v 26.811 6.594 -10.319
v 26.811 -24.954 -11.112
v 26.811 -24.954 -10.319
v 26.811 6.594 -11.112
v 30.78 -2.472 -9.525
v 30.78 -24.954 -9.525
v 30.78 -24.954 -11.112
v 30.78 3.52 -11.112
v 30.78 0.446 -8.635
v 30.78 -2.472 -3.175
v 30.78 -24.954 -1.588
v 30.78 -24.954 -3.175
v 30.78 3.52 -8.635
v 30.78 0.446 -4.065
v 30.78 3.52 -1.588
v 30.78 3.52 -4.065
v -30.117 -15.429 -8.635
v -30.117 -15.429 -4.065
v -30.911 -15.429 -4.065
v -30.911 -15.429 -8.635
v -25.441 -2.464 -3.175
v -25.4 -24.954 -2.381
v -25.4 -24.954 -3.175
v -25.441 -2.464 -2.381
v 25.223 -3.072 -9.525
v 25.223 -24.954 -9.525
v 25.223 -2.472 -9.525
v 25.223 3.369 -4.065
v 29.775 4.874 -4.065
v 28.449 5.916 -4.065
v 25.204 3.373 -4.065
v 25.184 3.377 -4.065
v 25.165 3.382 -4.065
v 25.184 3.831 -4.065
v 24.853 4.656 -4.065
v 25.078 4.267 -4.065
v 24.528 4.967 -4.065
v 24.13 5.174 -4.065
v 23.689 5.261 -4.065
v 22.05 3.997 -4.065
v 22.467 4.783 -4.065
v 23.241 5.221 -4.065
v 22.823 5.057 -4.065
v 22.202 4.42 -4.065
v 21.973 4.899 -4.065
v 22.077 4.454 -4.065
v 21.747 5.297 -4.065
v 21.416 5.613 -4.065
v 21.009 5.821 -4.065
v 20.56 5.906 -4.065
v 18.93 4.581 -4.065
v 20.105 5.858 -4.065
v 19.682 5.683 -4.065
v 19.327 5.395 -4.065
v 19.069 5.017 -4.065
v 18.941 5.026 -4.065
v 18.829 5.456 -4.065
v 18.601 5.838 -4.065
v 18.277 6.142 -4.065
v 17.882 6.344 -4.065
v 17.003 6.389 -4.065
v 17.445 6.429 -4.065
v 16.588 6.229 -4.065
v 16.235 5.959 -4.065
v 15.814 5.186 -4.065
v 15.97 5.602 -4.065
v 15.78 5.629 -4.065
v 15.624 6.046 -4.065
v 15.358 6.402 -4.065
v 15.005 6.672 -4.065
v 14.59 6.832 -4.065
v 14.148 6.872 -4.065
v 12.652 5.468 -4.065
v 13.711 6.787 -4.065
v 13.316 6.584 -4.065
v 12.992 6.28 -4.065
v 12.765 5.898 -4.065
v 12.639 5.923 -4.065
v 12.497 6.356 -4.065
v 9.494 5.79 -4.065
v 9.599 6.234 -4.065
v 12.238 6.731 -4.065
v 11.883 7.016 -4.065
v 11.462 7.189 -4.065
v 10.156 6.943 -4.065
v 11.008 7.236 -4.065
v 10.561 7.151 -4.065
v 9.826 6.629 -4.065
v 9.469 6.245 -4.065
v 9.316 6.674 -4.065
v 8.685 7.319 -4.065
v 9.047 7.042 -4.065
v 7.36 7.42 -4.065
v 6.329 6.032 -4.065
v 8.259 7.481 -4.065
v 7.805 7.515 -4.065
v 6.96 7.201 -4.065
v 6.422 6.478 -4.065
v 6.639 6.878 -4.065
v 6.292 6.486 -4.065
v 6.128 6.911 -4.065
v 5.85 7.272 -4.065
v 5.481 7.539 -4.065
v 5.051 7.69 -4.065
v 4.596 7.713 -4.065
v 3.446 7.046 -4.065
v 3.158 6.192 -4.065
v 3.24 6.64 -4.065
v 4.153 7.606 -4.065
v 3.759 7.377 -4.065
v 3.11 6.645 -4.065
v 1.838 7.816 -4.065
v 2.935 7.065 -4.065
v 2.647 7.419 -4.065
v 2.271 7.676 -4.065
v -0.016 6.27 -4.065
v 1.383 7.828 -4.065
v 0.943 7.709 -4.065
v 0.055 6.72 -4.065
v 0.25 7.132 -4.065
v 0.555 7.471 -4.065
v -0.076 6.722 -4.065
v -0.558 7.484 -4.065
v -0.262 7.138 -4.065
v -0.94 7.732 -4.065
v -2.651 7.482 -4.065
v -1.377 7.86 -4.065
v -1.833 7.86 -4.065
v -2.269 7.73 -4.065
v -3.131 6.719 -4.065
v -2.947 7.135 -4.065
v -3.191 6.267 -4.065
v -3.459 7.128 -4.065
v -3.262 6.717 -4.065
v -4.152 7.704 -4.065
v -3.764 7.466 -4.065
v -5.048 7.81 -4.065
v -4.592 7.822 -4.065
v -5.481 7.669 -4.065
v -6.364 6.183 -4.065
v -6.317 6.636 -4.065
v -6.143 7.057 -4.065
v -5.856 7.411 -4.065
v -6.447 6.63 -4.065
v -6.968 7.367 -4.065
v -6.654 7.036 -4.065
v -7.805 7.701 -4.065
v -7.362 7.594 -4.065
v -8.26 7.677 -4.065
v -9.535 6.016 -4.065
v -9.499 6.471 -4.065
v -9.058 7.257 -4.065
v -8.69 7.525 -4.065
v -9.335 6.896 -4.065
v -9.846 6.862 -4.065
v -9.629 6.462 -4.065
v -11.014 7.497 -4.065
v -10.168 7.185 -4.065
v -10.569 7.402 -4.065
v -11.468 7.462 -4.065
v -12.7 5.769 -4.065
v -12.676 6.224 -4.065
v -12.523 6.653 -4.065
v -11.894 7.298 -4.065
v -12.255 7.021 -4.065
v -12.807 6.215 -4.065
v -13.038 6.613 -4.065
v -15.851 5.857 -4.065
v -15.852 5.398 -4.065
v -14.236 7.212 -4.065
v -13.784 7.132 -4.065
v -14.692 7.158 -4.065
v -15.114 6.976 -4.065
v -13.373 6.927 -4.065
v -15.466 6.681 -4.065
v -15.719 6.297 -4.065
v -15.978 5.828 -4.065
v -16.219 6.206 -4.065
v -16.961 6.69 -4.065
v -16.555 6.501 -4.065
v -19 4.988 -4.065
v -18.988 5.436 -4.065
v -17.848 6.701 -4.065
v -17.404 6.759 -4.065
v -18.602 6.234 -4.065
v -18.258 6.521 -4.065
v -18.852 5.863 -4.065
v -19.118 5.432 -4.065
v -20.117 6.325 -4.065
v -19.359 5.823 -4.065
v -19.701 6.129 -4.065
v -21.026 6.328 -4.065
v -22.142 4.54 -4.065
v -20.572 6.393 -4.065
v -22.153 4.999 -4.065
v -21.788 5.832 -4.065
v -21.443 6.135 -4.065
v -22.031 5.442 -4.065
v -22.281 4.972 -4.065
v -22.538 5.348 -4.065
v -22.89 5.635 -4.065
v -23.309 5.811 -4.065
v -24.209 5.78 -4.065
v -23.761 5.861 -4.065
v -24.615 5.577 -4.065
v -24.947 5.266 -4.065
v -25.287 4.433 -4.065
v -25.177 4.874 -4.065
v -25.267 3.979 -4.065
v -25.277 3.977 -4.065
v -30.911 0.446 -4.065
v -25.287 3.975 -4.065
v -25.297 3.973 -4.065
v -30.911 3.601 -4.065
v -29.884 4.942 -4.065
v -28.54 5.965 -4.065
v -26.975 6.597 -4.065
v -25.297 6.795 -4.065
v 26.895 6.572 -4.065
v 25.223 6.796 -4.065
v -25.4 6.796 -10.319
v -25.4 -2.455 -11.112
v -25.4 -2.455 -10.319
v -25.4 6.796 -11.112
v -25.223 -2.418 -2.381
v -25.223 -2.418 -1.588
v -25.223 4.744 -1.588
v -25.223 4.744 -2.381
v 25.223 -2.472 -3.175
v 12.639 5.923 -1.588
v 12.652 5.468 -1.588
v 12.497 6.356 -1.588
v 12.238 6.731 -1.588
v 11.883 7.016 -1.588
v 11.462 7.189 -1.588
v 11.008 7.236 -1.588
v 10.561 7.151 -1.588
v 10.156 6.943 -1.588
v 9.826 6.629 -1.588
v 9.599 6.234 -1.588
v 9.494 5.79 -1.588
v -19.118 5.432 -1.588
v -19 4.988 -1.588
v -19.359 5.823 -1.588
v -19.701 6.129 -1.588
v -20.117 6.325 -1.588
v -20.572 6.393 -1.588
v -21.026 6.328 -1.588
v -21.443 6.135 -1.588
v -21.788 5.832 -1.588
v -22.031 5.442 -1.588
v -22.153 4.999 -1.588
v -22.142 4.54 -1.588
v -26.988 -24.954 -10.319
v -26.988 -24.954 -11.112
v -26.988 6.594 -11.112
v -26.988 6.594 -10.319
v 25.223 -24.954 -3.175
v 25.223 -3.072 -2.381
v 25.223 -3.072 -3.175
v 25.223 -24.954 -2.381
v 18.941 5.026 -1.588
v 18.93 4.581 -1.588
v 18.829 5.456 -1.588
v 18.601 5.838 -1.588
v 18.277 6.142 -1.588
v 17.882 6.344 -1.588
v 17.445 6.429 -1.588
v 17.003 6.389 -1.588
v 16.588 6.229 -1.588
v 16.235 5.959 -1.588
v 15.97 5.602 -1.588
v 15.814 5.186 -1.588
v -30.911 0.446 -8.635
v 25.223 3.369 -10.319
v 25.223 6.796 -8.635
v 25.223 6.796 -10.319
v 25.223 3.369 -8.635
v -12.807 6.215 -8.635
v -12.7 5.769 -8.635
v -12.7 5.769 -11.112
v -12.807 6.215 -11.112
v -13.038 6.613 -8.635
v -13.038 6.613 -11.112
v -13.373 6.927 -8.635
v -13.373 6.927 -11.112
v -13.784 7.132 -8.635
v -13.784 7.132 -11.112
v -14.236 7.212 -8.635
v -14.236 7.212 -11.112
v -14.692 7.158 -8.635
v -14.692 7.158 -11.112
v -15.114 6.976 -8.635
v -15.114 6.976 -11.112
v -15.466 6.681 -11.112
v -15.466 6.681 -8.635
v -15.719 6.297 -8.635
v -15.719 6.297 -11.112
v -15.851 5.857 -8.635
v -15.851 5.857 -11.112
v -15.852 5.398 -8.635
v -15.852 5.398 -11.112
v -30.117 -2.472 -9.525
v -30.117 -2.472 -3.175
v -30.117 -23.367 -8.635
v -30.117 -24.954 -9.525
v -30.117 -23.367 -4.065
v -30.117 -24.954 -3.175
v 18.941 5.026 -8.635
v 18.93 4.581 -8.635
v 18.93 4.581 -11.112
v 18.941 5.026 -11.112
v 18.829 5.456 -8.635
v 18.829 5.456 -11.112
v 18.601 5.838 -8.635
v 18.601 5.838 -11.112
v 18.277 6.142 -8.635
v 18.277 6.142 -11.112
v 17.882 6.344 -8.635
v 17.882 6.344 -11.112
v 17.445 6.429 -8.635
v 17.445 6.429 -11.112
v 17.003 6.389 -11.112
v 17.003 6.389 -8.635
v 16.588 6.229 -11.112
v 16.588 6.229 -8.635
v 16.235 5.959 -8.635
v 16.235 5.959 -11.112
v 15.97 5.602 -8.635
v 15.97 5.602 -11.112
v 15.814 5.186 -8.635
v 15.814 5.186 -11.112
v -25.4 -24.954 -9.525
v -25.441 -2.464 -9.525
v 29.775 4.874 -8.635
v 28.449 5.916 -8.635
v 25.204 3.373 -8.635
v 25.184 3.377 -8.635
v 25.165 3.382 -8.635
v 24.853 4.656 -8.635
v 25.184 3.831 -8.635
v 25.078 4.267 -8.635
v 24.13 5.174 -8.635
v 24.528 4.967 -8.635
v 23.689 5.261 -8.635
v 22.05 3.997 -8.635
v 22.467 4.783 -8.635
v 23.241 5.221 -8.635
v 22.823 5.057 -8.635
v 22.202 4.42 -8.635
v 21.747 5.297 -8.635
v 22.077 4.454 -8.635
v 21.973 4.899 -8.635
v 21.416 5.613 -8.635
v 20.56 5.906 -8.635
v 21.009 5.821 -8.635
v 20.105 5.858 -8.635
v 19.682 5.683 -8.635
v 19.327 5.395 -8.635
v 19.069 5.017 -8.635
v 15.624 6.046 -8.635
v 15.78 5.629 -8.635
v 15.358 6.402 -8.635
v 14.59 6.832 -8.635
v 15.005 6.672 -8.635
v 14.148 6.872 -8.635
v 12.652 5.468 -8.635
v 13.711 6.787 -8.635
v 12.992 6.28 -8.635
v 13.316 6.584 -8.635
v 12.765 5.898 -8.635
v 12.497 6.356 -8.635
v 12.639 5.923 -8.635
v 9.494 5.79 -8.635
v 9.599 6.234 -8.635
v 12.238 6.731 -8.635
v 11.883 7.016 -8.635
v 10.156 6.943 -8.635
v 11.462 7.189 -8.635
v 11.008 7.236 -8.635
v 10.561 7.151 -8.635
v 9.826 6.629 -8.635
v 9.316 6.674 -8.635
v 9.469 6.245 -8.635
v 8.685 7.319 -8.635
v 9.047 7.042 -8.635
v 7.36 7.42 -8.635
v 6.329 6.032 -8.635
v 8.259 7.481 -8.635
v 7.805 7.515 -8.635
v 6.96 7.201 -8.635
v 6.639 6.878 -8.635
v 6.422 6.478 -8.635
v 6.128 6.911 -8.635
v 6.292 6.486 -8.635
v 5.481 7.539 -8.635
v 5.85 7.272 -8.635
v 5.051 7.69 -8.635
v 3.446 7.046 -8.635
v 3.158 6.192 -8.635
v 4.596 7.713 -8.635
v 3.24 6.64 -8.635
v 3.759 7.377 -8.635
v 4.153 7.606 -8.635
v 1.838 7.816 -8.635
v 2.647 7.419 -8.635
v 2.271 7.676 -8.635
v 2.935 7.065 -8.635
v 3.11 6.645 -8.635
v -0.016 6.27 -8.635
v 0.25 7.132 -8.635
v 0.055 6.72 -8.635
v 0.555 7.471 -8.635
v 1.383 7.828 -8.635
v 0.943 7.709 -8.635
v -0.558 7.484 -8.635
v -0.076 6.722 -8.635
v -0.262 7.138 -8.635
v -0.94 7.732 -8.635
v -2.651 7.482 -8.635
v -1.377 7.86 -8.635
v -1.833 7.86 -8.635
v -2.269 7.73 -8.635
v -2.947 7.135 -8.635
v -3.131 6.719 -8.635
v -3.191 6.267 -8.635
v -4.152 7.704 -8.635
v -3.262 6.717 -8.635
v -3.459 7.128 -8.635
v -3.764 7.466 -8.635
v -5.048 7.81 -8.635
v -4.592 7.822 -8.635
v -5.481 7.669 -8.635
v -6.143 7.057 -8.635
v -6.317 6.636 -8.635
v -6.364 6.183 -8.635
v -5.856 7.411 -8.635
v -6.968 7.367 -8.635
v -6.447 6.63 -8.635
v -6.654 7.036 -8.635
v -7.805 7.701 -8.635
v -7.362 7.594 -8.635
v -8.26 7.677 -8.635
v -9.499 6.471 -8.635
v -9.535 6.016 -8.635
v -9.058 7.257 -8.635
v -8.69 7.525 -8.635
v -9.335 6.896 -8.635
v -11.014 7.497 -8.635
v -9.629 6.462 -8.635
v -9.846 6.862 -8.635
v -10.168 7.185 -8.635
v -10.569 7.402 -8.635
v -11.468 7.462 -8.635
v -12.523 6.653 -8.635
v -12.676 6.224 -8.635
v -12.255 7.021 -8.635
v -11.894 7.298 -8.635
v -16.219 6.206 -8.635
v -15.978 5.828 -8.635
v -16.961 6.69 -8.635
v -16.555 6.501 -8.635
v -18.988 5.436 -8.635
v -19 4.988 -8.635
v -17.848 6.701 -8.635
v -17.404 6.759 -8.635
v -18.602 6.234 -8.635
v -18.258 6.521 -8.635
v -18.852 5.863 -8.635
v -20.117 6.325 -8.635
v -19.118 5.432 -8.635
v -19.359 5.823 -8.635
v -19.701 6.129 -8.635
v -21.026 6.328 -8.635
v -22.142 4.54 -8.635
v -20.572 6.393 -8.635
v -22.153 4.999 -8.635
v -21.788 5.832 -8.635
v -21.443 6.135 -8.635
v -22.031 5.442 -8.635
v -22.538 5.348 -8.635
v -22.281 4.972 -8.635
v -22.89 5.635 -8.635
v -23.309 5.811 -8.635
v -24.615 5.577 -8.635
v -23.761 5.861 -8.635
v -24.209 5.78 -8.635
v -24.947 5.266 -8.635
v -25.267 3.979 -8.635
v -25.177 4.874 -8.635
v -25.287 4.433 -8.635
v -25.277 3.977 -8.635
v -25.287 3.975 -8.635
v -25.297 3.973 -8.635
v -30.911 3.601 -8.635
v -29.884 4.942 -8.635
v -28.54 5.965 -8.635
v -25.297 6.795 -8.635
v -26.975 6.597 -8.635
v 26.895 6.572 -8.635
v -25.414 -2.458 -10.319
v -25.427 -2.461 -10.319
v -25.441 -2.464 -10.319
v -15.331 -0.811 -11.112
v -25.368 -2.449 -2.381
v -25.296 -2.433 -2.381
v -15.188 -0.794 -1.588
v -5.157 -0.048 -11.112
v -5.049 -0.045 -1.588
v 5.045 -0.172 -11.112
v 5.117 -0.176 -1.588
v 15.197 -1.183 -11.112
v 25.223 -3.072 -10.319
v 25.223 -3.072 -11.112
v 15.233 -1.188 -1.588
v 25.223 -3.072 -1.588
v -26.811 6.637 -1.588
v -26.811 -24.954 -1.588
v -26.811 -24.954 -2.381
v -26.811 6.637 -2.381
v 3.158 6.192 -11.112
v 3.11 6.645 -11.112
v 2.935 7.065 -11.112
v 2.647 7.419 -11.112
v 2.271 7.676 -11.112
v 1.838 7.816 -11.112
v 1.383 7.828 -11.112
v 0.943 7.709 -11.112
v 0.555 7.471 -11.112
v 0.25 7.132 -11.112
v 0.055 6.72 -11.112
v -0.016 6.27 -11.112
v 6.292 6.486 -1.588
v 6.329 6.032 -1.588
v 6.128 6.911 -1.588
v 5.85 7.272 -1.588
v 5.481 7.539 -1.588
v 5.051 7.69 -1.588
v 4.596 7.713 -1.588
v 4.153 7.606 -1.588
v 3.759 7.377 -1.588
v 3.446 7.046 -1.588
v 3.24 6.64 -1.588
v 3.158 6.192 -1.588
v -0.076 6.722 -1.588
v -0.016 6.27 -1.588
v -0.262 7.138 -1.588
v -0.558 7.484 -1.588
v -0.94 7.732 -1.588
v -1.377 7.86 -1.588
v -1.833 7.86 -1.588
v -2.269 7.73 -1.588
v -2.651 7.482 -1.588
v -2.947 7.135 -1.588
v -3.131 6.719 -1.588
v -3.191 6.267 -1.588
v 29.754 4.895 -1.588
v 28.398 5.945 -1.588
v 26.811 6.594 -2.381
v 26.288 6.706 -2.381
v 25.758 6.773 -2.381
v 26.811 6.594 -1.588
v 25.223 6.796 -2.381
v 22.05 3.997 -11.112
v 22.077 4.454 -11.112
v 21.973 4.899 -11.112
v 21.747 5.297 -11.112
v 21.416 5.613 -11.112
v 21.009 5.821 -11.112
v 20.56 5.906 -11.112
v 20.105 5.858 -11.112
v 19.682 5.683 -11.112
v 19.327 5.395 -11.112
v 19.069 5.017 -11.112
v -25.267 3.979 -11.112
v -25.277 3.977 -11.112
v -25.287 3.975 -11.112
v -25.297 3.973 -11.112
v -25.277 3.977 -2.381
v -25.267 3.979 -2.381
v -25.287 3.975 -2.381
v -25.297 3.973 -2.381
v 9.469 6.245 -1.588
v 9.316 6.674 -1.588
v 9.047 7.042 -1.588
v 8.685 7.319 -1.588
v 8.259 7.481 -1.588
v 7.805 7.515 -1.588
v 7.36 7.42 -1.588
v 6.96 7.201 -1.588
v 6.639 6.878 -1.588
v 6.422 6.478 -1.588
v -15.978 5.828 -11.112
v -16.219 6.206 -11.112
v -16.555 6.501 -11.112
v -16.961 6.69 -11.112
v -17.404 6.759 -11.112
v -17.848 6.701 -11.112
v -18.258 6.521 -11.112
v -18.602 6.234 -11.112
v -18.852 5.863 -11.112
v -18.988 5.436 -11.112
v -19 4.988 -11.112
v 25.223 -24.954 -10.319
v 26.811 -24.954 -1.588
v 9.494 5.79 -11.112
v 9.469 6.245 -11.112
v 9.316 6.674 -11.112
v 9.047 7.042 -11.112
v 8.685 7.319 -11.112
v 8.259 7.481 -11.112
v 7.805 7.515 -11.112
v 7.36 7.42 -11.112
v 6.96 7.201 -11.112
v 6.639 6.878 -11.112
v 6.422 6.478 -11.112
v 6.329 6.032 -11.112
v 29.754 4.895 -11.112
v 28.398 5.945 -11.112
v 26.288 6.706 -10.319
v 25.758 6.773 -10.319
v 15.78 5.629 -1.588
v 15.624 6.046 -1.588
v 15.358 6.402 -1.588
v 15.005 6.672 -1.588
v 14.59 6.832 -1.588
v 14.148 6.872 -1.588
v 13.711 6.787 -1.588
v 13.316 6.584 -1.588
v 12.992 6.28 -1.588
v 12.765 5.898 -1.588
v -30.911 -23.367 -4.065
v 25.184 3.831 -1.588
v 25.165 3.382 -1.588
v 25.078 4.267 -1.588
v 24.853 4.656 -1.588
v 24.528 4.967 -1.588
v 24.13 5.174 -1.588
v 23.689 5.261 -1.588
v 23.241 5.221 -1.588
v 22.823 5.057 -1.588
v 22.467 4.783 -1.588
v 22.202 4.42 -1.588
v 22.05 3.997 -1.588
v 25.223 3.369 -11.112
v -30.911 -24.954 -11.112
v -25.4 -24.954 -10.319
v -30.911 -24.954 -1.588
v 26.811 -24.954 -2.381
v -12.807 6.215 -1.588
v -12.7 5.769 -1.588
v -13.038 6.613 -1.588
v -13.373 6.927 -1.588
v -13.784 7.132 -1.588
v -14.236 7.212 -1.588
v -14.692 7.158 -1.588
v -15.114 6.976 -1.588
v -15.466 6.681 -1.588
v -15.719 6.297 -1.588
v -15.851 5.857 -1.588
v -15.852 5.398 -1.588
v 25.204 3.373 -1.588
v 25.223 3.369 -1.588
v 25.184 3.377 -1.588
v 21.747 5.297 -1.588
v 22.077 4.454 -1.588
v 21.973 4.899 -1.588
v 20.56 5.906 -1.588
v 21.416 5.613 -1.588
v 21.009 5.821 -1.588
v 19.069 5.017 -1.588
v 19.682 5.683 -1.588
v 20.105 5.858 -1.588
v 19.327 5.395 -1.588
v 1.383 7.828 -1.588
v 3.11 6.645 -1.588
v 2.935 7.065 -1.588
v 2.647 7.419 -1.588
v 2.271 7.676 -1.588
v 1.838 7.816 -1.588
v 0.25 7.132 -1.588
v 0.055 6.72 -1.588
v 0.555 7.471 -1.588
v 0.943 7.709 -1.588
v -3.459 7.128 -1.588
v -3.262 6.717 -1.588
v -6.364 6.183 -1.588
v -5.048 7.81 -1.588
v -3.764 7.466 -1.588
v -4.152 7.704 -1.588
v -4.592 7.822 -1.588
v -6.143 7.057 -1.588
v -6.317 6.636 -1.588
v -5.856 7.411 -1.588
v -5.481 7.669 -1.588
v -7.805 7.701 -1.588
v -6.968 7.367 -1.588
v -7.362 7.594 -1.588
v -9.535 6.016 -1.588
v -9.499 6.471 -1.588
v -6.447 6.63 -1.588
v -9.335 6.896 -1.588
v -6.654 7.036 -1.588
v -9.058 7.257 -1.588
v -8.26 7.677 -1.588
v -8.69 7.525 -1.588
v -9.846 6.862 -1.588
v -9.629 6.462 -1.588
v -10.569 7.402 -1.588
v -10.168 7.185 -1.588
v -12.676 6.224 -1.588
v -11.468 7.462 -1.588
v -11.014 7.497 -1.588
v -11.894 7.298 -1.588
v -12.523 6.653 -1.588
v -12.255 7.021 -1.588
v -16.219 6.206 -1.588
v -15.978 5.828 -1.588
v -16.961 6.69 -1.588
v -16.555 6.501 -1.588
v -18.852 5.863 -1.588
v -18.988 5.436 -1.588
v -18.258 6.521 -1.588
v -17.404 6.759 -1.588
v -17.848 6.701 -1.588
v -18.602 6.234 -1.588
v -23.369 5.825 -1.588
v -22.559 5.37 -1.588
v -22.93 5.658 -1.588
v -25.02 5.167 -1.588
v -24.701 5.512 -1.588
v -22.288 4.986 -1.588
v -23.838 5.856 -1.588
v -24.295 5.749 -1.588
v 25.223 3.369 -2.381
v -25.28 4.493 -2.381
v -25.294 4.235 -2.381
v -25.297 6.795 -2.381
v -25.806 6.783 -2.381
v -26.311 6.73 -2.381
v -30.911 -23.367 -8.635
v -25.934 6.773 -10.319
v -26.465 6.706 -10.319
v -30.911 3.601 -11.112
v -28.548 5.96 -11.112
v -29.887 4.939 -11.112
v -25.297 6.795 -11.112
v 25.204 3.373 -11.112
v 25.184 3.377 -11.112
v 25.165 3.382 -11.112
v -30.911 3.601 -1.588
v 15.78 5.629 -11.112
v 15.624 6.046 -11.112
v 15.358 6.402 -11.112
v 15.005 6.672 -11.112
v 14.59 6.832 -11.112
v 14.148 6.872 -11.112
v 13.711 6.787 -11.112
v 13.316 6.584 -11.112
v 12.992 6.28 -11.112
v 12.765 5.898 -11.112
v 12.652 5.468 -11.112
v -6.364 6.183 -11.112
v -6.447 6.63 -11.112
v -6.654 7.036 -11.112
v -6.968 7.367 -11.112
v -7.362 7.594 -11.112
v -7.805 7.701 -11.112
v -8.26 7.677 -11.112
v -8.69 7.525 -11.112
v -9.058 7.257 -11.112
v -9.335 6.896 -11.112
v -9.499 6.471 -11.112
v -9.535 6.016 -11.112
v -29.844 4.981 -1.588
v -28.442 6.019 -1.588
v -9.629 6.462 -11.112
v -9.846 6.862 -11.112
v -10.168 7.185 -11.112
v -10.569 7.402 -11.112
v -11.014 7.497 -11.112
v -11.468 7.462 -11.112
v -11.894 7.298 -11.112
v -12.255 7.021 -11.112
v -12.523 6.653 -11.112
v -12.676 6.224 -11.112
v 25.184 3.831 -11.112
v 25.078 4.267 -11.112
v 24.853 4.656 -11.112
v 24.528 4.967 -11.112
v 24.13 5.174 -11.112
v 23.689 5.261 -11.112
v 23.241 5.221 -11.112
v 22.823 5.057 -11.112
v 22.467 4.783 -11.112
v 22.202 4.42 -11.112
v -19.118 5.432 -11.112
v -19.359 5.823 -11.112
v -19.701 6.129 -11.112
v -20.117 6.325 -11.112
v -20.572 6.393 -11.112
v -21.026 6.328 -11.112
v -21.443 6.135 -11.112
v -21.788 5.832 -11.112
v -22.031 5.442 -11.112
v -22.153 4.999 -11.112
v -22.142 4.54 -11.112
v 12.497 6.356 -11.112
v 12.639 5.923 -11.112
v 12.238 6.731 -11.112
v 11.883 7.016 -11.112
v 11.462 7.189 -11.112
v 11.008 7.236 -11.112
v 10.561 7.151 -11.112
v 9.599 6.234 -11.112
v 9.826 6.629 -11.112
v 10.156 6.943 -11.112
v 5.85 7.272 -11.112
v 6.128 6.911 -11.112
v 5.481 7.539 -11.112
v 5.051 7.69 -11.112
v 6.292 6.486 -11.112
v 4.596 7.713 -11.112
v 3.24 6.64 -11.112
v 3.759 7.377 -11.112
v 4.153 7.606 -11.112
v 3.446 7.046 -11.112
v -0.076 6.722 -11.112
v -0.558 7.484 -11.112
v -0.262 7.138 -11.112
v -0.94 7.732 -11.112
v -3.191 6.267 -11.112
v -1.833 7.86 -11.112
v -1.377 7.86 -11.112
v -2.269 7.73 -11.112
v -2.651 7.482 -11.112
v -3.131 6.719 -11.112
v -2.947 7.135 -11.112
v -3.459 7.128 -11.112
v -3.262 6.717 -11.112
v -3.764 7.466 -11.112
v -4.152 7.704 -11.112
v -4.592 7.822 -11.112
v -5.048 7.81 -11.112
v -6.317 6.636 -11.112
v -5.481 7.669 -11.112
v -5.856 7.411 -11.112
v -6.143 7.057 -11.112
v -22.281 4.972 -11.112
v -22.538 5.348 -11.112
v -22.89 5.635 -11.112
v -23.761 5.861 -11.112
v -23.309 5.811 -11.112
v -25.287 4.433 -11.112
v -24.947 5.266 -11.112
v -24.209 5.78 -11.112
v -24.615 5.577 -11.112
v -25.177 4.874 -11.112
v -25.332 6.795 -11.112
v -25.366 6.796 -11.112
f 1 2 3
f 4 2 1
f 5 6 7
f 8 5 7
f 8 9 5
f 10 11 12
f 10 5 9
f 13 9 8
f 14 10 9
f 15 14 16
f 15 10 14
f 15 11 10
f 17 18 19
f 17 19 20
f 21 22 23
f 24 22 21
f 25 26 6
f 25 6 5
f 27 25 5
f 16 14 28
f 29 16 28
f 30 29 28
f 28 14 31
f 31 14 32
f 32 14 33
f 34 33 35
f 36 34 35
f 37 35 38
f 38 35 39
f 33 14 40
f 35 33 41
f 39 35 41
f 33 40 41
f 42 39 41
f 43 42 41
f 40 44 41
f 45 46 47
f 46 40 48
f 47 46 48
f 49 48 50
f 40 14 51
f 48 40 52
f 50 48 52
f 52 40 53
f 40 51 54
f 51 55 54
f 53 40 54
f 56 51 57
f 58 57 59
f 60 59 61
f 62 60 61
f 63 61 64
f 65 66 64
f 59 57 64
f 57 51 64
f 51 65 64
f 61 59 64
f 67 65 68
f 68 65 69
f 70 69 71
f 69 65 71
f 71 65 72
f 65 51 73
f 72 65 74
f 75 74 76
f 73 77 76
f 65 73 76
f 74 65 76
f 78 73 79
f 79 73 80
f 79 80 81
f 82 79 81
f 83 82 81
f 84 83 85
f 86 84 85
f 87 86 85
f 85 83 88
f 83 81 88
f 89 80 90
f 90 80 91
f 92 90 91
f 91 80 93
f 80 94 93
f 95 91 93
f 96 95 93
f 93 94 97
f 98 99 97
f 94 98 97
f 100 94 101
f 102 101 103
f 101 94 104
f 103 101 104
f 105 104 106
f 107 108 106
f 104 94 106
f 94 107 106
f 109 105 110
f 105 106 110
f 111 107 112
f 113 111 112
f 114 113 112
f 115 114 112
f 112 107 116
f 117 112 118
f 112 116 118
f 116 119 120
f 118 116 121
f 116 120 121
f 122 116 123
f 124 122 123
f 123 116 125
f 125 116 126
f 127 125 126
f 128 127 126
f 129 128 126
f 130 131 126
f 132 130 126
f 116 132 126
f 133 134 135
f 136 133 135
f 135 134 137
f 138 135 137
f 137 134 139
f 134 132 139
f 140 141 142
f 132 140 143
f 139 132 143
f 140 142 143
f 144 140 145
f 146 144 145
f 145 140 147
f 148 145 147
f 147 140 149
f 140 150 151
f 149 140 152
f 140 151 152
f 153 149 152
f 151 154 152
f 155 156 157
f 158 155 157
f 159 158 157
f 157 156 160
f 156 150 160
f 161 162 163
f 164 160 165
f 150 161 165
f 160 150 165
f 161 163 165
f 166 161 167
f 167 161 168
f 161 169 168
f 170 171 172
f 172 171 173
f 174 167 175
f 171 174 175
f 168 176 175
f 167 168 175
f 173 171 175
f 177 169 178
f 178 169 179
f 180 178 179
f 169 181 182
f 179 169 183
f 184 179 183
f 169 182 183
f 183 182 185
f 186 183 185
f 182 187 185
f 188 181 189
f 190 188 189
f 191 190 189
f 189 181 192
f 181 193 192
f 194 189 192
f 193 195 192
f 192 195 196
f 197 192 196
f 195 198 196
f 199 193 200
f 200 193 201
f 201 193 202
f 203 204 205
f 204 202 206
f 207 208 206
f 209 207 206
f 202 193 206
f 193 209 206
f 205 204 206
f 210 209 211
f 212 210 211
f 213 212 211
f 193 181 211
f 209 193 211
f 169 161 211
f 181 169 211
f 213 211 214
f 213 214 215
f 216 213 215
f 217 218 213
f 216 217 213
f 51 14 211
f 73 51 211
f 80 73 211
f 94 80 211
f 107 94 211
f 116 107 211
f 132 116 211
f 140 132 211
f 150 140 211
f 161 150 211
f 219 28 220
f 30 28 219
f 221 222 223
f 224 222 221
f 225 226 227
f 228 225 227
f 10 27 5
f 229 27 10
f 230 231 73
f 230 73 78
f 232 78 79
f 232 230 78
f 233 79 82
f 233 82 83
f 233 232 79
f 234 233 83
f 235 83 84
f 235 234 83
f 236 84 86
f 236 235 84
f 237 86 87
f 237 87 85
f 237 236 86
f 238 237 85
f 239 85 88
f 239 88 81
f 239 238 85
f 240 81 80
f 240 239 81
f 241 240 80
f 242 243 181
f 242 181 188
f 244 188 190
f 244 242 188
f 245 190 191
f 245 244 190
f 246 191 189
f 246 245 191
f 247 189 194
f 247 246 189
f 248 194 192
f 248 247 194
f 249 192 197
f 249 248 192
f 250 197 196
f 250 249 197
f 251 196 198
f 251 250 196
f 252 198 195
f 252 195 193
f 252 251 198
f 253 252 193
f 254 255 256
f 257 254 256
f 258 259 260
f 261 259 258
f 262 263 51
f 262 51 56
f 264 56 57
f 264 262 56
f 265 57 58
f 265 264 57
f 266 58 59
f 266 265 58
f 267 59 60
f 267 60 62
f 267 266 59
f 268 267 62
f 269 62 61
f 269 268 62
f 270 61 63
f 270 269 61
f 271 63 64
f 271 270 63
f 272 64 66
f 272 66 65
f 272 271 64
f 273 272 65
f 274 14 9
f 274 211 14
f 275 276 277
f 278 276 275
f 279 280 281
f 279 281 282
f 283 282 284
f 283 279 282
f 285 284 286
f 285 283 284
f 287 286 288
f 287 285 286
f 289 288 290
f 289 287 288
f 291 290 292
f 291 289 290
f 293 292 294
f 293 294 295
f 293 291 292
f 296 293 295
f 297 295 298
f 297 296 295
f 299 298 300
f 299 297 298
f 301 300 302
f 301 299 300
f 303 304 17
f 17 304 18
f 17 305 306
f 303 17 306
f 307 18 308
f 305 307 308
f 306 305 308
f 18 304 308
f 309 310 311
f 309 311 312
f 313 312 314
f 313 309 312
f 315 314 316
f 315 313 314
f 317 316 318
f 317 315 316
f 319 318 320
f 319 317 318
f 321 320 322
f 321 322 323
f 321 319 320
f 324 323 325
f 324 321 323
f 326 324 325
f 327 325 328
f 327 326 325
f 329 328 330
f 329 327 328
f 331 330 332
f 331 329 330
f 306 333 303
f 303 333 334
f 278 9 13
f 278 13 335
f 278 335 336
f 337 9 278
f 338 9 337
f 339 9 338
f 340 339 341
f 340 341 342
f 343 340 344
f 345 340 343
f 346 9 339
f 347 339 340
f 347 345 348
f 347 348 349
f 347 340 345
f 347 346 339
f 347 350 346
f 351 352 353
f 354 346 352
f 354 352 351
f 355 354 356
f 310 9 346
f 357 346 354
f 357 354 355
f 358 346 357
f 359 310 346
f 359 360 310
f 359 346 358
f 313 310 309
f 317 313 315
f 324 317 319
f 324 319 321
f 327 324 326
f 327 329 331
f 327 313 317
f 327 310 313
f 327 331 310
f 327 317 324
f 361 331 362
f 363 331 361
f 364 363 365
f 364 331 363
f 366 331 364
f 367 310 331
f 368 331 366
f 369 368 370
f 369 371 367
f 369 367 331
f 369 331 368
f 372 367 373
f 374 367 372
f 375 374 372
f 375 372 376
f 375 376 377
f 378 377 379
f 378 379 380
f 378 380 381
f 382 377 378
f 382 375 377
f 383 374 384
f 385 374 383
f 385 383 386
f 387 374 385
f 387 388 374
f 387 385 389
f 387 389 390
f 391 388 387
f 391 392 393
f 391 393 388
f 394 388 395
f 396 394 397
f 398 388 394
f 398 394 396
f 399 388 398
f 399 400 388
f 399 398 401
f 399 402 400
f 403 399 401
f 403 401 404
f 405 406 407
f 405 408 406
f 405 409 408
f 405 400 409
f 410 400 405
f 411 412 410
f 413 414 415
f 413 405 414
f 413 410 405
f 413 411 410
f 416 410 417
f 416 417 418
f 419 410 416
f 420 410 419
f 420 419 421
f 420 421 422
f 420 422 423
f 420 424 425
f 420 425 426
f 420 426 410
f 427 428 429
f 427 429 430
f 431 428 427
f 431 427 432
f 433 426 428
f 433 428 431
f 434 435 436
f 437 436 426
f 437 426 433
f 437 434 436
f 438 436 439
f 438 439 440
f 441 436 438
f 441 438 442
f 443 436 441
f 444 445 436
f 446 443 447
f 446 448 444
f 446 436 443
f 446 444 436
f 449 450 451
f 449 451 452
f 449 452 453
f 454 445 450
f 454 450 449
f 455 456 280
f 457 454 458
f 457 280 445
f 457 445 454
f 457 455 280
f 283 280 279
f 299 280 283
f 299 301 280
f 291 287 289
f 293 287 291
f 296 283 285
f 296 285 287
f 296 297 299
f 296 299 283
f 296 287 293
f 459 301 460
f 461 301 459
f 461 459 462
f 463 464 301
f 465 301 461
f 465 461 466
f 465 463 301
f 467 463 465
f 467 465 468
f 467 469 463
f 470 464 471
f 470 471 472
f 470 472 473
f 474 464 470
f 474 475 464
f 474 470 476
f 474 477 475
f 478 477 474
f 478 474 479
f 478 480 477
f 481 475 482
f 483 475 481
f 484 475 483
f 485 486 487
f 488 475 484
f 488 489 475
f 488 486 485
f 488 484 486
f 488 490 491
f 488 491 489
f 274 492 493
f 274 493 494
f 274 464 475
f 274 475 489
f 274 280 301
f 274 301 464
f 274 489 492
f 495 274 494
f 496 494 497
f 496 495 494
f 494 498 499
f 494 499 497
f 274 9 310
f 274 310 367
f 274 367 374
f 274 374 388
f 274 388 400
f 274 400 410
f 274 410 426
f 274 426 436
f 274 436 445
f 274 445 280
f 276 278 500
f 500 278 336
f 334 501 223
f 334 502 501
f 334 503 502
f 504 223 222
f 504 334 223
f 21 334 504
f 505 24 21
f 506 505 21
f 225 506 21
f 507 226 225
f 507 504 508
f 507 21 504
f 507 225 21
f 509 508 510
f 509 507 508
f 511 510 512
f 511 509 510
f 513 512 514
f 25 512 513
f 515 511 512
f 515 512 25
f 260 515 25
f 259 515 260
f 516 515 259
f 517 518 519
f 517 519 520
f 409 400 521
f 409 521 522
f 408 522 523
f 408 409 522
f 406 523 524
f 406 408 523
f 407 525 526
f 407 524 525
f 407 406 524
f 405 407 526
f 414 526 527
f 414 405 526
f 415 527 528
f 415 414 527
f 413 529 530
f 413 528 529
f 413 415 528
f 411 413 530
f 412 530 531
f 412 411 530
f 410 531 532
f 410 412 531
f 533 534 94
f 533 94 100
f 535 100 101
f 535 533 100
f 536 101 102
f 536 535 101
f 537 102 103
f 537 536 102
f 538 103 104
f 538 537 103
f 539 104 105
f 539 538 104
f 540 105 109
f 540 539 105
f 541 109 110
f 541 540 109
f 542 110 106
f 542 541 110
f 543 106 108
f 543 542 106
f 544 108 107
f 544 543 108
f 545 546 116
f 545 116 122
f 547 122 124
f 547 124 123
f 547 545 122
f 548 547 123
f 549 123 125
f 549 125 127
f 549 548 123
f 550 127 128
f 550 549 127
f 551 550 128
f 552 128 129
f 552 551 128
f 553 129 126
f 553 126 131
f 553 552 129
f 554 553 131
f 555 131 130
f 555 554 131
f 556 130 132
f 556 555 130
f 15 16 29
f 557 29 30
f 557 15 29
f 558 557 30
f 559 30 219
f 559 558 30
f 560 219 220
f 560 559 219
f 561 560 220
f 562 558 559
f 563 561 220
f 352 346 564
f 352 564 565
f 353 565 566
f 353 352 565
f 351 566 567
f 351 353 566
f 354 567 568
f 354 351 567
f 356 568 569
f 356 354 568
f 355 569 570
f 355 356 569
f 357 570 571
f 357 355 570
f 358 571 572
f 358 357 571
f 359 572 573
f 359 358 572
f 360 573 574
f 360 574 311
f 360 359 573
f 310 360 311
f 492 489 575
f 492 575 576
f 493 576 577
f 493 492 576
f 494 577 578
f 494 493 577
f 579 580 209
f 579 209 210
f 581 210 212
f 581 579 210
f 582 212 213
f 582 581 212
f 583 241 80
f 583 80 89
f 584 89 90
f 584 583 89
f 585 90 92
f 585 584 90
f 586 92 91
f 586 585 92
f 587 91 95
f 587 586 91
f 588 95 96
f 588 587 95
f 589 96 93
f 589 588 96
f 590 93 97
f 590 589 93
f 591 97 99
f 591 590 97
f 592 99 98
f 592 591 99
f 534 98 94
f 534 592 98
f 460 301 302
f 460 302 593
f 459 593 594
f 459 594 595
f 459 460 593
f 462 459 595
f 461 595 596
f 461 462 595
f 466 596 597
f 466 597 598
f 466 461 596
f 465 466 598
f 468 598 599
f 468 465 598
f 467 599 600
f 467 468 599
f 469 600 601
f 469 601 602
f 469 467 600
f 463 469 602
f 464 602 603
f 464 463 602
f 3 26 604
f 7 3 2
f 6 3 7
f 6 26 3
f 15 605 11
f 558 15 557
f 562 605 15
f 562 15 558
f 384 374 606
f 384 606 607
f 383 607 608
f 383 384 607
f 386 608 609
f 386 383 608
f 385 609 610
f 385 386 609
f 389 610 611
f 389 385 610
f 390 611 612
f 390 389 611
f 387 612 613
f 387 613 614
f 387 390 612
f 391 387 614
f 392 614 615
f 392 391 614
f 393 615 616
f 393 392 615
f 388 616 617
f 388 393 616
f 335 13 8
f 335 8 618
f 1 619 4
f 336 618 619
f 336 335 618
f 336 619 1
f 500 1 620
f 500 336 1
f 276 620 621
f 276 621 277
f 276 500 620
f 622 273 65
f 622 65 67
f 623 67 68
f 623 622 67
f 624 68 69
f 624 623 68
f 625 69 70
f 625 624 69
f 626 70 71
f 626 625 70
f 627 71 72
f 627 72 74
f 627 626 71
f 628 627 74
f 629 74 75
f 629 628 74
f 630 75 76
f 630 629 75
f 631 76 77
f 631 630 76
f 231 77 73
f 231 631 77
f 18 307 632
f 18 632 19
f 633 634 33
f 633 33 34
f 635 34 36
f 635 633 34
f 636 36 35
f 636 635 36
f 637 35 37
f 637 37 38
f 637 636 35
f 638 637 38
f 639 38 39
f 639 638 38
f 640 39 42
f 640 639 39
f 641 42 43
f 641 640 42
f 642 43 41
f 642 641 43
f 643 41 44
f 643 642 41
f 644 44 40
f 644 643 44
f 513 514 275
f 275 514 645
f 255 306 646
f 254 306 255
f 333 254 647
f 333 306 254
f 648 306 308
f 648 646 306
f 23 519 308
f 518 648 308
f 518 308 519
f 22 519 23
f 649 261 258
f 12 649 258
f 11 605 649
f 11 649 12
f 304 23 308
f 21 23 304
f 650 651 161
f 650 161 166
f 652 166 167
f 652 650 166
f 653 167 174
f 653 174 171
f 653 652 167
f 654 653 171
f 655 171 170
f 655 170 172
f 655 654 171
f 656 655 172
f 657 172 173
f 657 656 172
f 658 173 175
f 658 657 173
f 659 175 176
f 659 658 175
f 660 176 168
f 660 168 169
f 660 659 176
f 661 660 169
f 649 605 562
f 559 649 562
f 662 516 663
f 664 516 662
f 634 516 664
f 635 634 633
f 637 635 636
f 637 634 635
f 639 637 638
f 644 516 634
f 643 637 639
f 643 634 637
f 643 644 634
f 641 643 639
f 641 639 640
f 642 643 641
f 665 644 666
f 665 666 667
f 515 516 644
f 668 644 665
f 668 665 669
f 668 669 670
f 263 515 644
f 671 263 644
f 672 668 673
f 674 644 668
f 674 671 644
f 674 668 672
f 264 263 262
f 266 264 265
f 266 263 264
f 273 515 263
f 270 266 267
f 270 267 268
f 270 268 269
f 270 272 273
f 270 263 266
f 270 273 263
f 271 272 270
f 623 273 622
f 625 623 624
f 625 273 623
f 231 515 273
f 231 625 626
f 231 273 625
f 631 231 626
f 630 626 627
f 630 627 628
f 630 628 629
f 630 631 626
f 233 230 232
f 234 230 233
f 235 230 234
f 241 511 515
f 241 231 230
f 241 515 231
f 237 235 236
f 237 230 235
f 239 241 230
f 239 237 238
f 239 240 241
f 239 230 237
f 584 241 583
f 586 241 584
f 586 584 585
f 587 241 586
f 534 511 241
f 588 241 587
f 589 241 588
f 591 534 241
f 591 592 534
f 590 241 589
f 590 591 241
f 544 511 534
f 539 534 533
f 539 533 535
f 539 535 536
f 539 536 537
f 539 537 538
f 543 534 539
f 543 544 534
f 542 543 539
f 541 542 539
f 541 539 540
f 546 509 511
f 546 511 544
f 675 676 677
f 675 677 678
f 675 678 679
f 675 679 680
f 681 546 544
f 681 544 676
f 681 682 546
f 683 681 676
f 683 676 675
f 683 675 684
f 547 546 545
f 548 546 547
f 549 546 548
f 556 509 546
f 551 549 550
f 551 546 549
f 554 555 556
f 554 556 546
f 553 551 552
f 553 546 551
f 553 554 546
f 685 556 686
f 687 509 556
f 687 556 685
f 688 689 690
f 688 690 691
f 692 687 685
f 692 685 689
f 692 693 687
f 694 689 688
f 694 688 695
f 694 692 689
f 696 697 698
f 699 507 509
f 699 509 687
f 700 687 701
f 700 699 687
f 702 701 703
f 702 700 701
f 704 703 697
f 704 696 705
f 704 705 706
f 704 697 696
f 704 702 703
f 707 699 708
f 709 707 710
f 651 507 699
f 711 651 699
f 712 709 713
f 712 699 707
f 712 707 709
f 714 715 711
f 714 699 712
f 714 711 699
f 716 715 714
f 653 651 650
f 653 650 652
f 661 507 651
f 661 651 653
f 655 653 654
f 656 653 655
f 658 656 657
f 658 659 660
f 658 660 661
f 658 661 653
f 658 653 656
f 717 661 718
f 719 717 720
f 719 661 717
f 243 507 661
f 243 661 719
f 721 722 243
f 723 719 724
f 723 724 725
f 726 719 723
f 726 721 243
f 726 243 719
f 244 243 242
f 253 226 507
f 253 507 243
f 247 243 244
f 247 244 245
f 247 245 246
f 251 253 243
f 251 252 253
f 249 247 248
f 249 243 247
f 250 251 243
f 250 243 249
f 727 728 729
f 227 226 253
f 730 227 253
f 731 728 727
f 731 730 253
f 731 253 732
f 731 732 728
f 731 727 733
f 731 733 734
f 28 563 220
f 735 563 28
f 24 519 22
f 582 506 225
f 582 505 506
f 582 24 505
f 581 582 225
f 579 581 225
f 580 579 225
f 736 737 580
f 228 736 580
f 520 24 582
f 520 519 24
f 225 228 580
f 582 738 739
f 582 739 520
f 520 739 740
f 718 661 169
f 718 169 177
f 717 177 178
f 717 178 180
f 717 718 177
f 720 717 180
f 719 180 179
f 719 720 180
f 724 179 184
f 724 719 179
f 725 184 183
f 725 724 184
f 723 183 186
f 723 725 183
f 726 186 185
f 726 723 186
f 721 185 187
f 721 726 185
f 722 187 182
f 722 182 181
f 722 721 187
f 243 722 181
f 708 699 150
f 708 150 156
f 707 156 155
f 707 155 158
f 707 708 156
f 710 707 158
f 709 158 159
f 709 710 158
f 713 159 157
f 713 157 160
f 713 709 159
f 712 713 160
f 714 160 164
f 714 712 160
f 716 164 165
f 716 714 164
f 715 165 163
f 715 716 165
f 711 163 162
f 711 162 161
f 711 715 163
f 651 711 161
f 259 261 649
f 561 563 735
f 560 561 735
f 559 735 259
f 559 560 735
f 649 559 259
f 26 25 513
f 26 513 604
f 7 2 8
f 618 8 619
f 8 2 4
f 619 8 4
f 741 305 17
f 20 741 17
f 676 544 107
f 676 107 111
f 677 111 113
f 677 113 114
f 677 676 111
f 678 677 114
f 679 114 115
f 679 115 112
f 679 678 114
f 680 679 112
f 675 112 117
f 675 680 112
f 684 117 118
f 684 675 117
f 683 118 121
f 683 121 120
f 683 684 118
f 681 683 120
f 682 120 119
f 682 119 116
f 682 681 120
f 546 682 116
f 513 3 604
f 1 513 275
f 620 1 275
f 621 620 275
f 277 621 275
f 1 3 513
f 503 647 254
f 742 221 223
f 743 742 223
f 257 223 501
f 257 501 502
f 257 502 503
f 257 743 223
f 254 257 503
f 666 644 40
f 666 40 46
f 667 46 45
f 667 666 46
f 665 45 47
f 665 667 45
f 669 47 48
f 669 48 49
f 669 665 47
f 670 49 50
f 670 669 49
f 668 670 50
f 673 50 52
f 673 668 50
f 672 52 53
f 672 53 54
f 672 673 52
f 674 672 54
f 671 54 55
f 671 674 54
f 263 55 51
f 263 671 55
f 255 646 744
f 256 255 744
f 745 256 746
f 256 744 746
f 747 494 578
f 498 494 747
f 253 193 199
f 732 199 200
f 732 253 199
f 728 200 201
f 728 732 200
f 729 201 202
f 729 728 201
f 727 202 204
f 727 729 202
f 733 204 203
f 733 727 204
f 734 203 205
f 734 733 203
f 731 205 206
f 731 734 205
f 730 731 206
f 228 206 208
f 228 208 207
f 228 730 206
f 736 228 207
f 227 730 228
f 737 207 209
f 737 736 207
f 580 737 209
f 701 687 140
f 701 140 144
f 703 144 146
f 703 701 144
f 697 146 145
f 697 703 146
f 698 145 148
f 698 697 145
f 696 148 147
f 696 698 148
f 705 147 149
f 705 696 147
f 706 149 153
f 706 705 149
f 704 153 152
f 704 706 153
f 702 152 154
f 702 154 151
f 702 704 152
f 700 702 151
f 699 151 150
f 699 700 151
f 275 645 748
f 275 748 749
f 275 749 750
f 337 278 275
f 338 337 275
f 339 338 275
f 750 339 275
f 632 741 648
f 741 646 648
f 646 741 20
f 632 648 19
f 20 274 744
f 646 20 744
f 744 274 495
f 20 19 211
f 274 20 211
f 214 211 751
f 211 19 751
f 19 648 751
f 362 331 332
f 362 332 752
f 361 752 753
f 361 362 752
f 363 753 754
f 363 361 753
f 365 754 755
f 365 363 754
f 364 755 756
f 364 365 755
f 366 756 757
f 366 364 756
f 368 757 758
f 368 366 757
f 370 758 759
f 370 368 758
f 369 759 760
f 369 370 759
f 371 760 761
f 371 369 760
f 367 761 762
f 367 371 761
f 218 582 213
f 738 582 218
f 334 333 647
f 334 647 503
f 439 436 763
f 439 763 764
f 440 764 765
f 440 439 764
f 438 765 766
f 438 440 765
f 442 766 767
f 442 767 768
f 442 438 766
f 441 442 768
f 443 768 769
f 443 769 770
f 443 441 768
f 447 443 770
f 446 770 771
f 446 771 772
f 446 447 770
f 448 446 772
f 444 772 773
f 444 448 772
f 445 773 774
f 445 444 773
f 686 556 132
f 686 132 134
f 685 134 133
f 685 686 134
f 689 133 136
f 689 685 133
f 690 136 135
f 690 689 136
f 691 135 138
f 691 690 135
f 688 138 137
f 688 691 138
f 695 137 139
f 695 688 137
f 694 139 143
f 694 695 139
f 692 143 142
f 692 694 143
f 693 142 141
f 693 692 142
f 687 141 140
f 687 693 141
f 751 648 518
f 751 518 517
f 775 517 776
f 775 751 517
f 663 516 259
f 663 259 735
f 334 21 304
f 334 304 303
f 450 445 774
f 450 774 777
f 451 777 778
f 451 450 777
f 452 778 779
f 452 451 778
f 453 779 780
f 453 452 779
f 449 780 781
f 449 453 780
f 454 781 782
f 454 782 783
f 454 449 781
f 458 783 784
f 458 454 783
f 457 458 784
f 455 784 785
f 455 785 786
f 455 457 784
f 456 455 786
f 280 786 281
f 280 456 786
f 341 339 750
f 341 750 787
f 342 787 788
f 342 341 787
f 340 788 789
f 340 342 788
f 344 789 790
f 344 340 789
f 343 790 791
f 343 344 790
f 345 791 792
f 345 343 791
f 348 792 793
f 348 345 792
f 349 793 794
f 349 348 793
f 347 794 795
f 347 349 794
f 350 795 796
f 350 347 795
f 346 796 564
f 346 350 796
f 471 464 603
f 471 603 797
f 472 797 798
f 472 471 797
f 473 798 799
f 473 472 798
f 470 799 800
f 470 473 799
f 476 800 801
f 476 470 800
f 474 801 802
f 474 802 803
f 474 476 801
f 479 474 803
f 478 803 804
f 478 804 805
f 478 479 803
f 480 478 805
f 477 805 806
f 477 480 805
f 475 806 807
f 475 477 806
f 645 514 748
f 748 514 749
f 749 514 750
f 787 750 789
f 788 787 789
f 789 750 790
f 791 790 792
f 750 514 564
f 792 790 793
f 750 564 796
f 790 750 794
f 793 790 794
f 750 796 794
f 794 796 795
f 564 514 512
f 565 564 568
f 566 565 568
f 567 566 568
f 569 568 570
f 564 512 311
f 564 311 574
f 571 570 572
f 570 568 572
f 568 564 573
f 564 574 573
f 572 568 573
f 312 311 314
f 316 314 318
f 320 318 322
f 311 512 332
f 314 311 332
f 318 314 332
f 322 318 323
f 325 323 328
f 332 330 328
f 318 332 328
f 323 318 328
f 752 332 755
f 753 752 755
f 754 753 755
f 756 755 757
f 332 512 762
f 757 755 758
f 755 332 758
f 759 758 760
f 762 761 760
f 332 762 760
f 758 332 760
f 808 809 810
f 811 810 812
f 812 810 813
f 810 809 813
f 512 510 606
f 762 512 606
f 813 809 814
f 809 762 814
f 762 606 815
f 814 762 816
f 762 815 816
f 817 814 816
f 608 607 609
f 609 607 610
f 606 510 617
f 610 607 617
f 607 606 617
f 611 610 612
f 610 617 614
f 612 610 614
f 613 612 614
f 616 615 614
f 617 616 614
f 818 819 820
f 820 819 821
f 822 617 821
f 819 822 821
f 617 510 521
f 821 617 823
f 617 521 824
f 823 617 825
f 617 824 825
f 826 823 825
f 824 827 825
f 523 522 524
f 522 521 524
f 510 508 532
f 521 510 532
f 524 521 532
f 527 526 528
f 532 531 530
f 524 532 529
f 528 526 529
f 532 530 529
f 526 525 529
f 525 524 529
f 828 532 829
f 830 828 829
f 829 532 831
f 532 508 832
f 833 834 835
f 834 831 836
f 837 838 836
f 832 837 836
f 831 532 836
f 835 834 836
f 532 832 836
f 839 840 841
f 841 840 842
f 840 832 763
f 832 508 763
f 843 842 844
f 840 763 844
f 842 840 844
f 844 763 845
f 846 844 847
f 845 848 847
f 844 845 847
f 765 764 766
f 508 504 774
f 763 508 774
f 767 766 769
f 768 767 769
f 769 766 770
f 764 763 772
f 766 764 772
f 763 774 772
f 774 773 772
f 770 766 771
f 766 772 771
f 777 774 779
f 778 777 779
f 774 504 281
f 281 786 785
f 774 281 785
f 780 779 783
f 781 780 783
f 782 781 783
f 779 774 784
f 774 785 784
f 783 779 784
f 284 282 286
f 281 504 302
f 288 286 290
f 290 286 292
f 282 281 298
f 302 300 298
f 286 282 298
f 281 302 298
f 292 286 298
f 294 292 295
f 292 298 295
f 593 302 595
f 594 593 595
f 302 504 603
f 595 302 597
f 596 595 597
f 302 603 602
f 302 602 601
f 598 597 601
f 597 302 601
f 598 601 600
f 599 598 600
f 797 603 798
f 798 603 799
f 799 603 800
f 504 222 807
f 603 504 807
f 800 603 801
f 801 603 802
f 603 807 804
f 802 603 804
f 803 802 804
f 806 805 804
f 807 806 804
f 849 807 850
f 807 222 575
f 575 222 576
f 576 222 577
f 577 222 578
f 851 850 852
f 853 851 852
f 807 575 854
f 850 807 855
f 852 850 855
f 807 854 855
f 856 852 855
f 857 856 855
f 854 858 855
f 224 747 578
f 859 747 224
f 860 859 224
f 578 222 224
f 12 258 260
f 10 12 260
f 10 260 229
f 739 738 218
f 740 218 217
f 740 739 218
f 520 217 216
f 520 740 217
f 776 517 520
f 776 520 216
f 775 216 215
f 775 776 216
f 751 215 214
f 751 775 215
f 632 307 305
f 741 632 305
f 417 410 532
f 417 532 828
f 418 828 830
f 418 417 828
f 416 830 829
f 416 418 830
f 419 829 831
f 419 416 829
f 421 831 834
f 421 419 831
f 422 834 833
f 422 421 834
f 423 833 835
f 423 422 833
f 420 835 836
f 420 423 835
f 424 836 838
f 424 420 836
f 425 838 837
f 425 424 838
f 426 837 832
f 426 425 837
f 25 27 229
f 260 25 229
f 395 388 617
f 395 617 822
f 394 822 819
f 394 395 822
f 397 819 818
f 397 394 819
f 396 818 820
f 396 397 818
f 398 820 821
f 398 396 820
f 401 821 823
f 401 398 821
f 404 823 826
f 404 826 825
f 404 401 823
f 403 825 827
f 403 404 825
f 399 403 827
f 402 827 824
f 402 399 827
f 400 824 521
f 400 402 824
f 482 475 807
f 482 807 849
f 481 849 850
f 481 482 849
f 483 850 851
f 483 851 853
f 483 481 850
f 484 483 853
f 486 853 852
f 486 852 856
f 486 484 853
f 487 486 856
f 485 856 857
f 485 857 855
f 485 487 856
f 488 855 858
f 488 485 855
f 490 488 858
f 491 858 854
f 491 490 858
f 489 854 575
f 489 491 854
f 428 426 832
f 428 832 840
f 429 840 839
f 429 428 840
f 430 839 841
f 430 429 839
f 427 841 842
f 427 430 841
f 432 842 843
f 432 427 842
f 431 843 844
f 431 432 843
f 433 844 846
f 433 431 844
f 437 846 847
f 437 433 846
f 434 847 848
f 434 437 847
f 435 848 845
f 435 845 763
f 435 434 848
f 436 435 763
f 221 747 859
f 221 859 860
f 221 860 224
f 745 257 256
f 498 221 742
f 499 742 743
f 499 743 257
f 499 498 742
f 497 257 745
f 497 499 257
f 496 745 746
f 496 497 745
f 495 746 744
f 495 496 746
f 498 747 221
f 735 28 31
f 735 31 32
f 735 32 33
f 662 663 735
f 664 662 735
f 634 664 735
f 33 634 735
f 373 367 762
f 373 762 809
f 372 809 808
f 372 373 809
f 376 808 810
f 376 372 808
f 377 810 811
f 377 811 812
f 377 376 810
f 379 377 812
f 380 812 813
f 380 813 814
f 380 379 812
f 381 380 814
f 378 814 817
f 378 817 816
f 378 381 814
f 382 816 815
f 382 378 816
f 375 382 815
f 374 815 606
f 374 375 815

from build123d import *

# Parameters (mm, degrees)
BOSS_EXTRUDE1_DEPTH              = 12.7
SKETCH3_W                        = 4.569606656
SKETCH3_H                        = 12.610946307
CUT_EXTRUDE1_DEPTH               = 32.573497659
CUT_EXTRUDE1_DEPTH_BACK          = 32.704428158
SKETCH4_W                        = 4.569606656
SKETCH4_H                        = 7.9375
CUT_EXTRUDE2_DEPTH               = 66.04
SKETCH5_W                        = 1.5875
SKETCH5_H                        = 39.725965327
CUT_EXTRUDE3_DEPTH               = 32.573497659
CUT_EXTRUDE3_DEPTH_BACK          = 32.704428158
SKETCH6_W                        = 1.5875
SKETCH6_H                        = 40.415060451
CUT_EXTRUDE4_DEPTH               = 0.79375
SKETCH7_W                        = 1.5875
SKETCH7_H                        = 38.718479636
SKETCH7_H_2                      = 39.708151778
CUT_EXTRUDE5_DEPTH               = 0.79375
CUT_EXTRUDE6_REACH               = 9.892
CUT_EXTRUDE6_OFFSET_FROM_SURFACE = 1.5875
SKETCH8_W                        = 6.35
SKETCH8_H                        = 22.490762182
SKETCH9_W                        = 6.35
SKETCH9_H                        = 22.482269966
CUT_EXTRUDE7_DEPTH               = 5.55625
SKETCH10_W                       = 0.79375
SKETCH10_H                       = 36.880517087
CUT_EXTRUDE8_DEPTH               = 12.1125


with BuildPart() as part:
    # Sketch1 → Boss-Extrude1 (new body)
    with BuildSketch(Plane.XY):
        with BuildLine():
            Line((25.223497659, -24.95432425), (31.573497659, -24.95432425))
            Line((31.573497659, -24.95432425), (31.573497659, 0.44567575))
            ThreePointArc((31.573497659, 0.44567575), (29.713625719, 4.935803811), (25.223497659, 6.79567575))
            Line((25.223497659, 6.79567575), (25.223497659, 3.36874218))
            ThreePointArc((25.223497659, 3.36874218), (25.194005143, 3.37526688), (25.164511033, 3.381784371))
            ThreePointArc((25.164511033, 3.381784371), (23.912297459, 5.232947026), (22.049913461, 3.997484421))
            ThreePointArc((22.049913461, 3.997484421), (20.787428344, 5.879791305), (18.929672437, 4.581449722))
            ThreePointArc((18.929672437, 4.581449722), (17.666399498, 6.401938478), (15.813867684, 5.186140916))
            ThreePointArc((15.813867684, 5.186140916), (14.370419451, 6.86745546), (12.652448322, 5.467835298))
            ThreePointArc((12.652448322, 5.467835298), (11.236710182, 7.228730664), (9.494148573, 5.790486593))
            ThreePointArc((9.494148573, 5.790486593), (8.033635968, 7.514426817), (6.328601682, 6.03188675))
            ThreePointArc((6.328601682, 6.03188675), (4.824278861, 7.717733664), (3.157897585, 6.191876393))
            ThreePointArc((3.157897585, 6.191876393), (1.610757722, 7.838516978), (-0.015870376, 6.270349895))
            ThreePointArc((-0.015870376, 6.270349895), (-1.604805836, 7.876697016), (-3.190606835, 6.267255447))
            ThreePointArc((-3.190606835, 6.267255447), (-4.820288856, 7.832248571), (-6.364215787, 6.182595092))
            ThreePointArc((-6.364215787, 6.182595092), (-8.033568431, 7.705200989), (-9.534601973, 6.016424724))
            ThreePointArc((-9.534601973, 6.016424724), (-11.24252311, 7.495638149), (-12.69967226, 5.76885405))
            ThreePointArc((-12.69967226, 5.76885405), (-14.466077033, 7.201365285), (-15.851850507, 5.398061056))
            ThreePointArc((-15.851850507, 5.398061056), (-17.628014087, 6.745603643), (-18.999984081, 4.988240156))
            ThreePointArc((-18.999984081, 4.988240156), (-20.801252814, 6.376658399), (-22.142035626, 4.539656571))
            ThreePointArc((-22.142035626, 4.539656571), (-23.987693231, 5.836740457), (-25.266933007, 3.978670437))
            ThreePointArc((-25.266933007, 3.978670437), (-25.282113604, 3.97569181), (-25.297293828, 3.972711283))
            Line((-25.297293828, 3.972711283), (-25.297293828, 6.794845101))
            ThreePointArc((-25.297293828, 6.794845101), (-29.574532825, 5.2306288), (-31.704428158, 1.205073937))
            Line((-31.704428158, 1.205073937), (-31.704428158, -24.95432425))
            Line((-31.704428158, -24.95432425), (-25.4, -24.95432425))
            Line((-25.4, -24.95432425), (-25.440666935, -2.463598833))
            ThreePointArc((-25.440666935, -2.463598833), (-0.075359426, 0.000928604), (25.223497659, -3.071619312))
            Line((25.223497659, -3.071619312), (25.223497659, -24.95432425))
        make_face()
    extrude(amount=-BOSS_EXTRUDE1_DEPTH)

    # Sketch3 → Cut-Extrude1 (cut, two sides)
    with BuildSketch(Plane(origin=(0, 0, 0), x_dir=(0, 0, -1), z_dir=(1, 0, 0))) as cut_extrude1_sk:
        with Locations((6.35, 6.751148903)):
            Rectangle(SKETCH3_W, SKETCH3_H)
    extrude(amount=CUT_EXTRUDE1_DEPTH, mode=Mode.SUBTRACT)
    extrude(cut_extrude1_sk.sketch, amount=-CUT_EXTRUDE1_DEPTH_BACK, mode=Mode.SUBTRACT)

    # Sketch4 → Cut-Extrude2 (cut)
    with BuildSketch(Plane(origin=(31.573497659, 0, 0), x_dir=(0, 0, -1), z_dir=(1, 0, 0))):
        with Locations((6.35, -19.39807425)):
            Rectangle(SKETCH4_W, SKETCH4_H)
    extrude(amount=-CUT_EXTRUDE2_DEPTH, mode=Mode.SUBTRACT)

    # Sketch5 → Cut-Extrude3 (cut, two sides)
    with BuildSketch(Plane(origin=(0, 0, 0), x_dir=(0, 0, -1), z_dir=(1, 0, 0))) as cut_extrude3_sk:
        with Locations((0.79375, -5.091341587)):
            Rectangle(SKETCH5_W, SKETCH5_H)
        with Locations((11.90625, -5.091341587)):
            Rectangle(SKETCH5_W, SKETCH5_H)
    extrude(amount=CUT_EXTRUDE3_DEPTH, mode=Mode.SUBTRACT)
    extrude(cut_extrude3_sk.sketch, amount=-CUT_EXTRUDE3_DEPTH_BACK, mode=Mode.SUBTRACT)

    # Sketch6 → Cut-Extrude4 (cut)
    with BuildSketch(Plane.XY.offset(-1.5875)):
        with Locations((26.017247659, -4.746794025)):
            Rectangle(SKETCH6_W, SKETCH6_H)
        with Locations((-26.017247659, -4.746794025)):
            Rectangle(SKETCH6_W, SKETCH6_H)
    extrude(amount=-CUT_EXTRUDE4_DEPTH, mode=Mode.SUBTRACT)

    # Sketch7 → Cut-Extrude5 (cut)
    with BuildSketch(Plane(origin=(0, 0, -11.1125), x_dir=(-1, 0, 0), z_dir=(0, 0, -1))):
        with Locations((26.19375, -5.595084432)):
            Rectangle(SKETCH7_W, SKETCH7_H)
        with Locations((-26.017247659, -5.100248361)):
            Rectangle(SKETCH7_W, SKETCH7_H_2)
    extrude(amount=-CUT_EXTRUDE5_DEPTH, mode=Mode.SUBTRACT)

    # Cut-Extrude6: up to this face of the body (flat: up to its plane, moved by the offset)
    cut_extrude6_end = Plane(part.part.faces().sort_by_distance((-31.704428158, -10.78205278, -6.35))[0]).offset(-CUT_EXTRUDE6_OFFSET_FROM_SURFACE)
    # Sketch8 → Cut-Extrude6 (cut, up to the picked face)
    with BuildSketch(Plane(origin=(-25.445038336, -0.046008819, 0), x_dir=(0, 0, -1), z_dir=(0.999998365, 0.001808162, 0)), mode=Mode.PRIVATE) as cut_extrude6_sk1:
        with Locations((6.35, -13.662975058)):
            Rectangle(SKETCH8_W, SKETCH8_H)
    cut_extrude6_tool1 = split(extrude(cut_extrude6_sk1.sketch, amount=-CUT_EXTRUDE6_REACH, mode=Mode.PRIVATE), bisect_by=cut_extrude6_end, keep=Keep.BOTH, mode=Mode.PRIVATE)
    add(cut_extrude6_tool1.solids().sort_by_distance((-25.420333, -13.708962, -6.35))[0], mode=Mode.SUBTRACT)

    # Sketch9 → Cut-Extrude7 (cut)
    with BuildSketch(Plane.ZY.offset(-25.223497659)):
        with Locations((-6.35, -13.713189267)):
            Rectangle(SKETCH9_W, SKETCH9_H)
    extrude(amount=-CUT_EXTRUDE7_DEPTH, mode=Mode.SUBTRACT)

    # Sketch10 → Cut-Extrude8 (cut, through all)
    with BuildSketch(Plane.XY):
        Polygon((-31.704428158, -24.691676413), (-31.704428158, 9.381321615), (-30.910678158, 9.381321615), (-30.910678158, -24.691676413), (-30.910678158, -24.95432425), (-31.704428158, -24.95432425), align=None)
        with Locations((31.176622659, -6.514065707)):
            Rectangle(SKETCH10_W, SKETCH10_H)
    extrude(amount=-CUT_EXTRUDE8_DEPTH, mode=Mode.SUBTRACT)


solid = part.part
